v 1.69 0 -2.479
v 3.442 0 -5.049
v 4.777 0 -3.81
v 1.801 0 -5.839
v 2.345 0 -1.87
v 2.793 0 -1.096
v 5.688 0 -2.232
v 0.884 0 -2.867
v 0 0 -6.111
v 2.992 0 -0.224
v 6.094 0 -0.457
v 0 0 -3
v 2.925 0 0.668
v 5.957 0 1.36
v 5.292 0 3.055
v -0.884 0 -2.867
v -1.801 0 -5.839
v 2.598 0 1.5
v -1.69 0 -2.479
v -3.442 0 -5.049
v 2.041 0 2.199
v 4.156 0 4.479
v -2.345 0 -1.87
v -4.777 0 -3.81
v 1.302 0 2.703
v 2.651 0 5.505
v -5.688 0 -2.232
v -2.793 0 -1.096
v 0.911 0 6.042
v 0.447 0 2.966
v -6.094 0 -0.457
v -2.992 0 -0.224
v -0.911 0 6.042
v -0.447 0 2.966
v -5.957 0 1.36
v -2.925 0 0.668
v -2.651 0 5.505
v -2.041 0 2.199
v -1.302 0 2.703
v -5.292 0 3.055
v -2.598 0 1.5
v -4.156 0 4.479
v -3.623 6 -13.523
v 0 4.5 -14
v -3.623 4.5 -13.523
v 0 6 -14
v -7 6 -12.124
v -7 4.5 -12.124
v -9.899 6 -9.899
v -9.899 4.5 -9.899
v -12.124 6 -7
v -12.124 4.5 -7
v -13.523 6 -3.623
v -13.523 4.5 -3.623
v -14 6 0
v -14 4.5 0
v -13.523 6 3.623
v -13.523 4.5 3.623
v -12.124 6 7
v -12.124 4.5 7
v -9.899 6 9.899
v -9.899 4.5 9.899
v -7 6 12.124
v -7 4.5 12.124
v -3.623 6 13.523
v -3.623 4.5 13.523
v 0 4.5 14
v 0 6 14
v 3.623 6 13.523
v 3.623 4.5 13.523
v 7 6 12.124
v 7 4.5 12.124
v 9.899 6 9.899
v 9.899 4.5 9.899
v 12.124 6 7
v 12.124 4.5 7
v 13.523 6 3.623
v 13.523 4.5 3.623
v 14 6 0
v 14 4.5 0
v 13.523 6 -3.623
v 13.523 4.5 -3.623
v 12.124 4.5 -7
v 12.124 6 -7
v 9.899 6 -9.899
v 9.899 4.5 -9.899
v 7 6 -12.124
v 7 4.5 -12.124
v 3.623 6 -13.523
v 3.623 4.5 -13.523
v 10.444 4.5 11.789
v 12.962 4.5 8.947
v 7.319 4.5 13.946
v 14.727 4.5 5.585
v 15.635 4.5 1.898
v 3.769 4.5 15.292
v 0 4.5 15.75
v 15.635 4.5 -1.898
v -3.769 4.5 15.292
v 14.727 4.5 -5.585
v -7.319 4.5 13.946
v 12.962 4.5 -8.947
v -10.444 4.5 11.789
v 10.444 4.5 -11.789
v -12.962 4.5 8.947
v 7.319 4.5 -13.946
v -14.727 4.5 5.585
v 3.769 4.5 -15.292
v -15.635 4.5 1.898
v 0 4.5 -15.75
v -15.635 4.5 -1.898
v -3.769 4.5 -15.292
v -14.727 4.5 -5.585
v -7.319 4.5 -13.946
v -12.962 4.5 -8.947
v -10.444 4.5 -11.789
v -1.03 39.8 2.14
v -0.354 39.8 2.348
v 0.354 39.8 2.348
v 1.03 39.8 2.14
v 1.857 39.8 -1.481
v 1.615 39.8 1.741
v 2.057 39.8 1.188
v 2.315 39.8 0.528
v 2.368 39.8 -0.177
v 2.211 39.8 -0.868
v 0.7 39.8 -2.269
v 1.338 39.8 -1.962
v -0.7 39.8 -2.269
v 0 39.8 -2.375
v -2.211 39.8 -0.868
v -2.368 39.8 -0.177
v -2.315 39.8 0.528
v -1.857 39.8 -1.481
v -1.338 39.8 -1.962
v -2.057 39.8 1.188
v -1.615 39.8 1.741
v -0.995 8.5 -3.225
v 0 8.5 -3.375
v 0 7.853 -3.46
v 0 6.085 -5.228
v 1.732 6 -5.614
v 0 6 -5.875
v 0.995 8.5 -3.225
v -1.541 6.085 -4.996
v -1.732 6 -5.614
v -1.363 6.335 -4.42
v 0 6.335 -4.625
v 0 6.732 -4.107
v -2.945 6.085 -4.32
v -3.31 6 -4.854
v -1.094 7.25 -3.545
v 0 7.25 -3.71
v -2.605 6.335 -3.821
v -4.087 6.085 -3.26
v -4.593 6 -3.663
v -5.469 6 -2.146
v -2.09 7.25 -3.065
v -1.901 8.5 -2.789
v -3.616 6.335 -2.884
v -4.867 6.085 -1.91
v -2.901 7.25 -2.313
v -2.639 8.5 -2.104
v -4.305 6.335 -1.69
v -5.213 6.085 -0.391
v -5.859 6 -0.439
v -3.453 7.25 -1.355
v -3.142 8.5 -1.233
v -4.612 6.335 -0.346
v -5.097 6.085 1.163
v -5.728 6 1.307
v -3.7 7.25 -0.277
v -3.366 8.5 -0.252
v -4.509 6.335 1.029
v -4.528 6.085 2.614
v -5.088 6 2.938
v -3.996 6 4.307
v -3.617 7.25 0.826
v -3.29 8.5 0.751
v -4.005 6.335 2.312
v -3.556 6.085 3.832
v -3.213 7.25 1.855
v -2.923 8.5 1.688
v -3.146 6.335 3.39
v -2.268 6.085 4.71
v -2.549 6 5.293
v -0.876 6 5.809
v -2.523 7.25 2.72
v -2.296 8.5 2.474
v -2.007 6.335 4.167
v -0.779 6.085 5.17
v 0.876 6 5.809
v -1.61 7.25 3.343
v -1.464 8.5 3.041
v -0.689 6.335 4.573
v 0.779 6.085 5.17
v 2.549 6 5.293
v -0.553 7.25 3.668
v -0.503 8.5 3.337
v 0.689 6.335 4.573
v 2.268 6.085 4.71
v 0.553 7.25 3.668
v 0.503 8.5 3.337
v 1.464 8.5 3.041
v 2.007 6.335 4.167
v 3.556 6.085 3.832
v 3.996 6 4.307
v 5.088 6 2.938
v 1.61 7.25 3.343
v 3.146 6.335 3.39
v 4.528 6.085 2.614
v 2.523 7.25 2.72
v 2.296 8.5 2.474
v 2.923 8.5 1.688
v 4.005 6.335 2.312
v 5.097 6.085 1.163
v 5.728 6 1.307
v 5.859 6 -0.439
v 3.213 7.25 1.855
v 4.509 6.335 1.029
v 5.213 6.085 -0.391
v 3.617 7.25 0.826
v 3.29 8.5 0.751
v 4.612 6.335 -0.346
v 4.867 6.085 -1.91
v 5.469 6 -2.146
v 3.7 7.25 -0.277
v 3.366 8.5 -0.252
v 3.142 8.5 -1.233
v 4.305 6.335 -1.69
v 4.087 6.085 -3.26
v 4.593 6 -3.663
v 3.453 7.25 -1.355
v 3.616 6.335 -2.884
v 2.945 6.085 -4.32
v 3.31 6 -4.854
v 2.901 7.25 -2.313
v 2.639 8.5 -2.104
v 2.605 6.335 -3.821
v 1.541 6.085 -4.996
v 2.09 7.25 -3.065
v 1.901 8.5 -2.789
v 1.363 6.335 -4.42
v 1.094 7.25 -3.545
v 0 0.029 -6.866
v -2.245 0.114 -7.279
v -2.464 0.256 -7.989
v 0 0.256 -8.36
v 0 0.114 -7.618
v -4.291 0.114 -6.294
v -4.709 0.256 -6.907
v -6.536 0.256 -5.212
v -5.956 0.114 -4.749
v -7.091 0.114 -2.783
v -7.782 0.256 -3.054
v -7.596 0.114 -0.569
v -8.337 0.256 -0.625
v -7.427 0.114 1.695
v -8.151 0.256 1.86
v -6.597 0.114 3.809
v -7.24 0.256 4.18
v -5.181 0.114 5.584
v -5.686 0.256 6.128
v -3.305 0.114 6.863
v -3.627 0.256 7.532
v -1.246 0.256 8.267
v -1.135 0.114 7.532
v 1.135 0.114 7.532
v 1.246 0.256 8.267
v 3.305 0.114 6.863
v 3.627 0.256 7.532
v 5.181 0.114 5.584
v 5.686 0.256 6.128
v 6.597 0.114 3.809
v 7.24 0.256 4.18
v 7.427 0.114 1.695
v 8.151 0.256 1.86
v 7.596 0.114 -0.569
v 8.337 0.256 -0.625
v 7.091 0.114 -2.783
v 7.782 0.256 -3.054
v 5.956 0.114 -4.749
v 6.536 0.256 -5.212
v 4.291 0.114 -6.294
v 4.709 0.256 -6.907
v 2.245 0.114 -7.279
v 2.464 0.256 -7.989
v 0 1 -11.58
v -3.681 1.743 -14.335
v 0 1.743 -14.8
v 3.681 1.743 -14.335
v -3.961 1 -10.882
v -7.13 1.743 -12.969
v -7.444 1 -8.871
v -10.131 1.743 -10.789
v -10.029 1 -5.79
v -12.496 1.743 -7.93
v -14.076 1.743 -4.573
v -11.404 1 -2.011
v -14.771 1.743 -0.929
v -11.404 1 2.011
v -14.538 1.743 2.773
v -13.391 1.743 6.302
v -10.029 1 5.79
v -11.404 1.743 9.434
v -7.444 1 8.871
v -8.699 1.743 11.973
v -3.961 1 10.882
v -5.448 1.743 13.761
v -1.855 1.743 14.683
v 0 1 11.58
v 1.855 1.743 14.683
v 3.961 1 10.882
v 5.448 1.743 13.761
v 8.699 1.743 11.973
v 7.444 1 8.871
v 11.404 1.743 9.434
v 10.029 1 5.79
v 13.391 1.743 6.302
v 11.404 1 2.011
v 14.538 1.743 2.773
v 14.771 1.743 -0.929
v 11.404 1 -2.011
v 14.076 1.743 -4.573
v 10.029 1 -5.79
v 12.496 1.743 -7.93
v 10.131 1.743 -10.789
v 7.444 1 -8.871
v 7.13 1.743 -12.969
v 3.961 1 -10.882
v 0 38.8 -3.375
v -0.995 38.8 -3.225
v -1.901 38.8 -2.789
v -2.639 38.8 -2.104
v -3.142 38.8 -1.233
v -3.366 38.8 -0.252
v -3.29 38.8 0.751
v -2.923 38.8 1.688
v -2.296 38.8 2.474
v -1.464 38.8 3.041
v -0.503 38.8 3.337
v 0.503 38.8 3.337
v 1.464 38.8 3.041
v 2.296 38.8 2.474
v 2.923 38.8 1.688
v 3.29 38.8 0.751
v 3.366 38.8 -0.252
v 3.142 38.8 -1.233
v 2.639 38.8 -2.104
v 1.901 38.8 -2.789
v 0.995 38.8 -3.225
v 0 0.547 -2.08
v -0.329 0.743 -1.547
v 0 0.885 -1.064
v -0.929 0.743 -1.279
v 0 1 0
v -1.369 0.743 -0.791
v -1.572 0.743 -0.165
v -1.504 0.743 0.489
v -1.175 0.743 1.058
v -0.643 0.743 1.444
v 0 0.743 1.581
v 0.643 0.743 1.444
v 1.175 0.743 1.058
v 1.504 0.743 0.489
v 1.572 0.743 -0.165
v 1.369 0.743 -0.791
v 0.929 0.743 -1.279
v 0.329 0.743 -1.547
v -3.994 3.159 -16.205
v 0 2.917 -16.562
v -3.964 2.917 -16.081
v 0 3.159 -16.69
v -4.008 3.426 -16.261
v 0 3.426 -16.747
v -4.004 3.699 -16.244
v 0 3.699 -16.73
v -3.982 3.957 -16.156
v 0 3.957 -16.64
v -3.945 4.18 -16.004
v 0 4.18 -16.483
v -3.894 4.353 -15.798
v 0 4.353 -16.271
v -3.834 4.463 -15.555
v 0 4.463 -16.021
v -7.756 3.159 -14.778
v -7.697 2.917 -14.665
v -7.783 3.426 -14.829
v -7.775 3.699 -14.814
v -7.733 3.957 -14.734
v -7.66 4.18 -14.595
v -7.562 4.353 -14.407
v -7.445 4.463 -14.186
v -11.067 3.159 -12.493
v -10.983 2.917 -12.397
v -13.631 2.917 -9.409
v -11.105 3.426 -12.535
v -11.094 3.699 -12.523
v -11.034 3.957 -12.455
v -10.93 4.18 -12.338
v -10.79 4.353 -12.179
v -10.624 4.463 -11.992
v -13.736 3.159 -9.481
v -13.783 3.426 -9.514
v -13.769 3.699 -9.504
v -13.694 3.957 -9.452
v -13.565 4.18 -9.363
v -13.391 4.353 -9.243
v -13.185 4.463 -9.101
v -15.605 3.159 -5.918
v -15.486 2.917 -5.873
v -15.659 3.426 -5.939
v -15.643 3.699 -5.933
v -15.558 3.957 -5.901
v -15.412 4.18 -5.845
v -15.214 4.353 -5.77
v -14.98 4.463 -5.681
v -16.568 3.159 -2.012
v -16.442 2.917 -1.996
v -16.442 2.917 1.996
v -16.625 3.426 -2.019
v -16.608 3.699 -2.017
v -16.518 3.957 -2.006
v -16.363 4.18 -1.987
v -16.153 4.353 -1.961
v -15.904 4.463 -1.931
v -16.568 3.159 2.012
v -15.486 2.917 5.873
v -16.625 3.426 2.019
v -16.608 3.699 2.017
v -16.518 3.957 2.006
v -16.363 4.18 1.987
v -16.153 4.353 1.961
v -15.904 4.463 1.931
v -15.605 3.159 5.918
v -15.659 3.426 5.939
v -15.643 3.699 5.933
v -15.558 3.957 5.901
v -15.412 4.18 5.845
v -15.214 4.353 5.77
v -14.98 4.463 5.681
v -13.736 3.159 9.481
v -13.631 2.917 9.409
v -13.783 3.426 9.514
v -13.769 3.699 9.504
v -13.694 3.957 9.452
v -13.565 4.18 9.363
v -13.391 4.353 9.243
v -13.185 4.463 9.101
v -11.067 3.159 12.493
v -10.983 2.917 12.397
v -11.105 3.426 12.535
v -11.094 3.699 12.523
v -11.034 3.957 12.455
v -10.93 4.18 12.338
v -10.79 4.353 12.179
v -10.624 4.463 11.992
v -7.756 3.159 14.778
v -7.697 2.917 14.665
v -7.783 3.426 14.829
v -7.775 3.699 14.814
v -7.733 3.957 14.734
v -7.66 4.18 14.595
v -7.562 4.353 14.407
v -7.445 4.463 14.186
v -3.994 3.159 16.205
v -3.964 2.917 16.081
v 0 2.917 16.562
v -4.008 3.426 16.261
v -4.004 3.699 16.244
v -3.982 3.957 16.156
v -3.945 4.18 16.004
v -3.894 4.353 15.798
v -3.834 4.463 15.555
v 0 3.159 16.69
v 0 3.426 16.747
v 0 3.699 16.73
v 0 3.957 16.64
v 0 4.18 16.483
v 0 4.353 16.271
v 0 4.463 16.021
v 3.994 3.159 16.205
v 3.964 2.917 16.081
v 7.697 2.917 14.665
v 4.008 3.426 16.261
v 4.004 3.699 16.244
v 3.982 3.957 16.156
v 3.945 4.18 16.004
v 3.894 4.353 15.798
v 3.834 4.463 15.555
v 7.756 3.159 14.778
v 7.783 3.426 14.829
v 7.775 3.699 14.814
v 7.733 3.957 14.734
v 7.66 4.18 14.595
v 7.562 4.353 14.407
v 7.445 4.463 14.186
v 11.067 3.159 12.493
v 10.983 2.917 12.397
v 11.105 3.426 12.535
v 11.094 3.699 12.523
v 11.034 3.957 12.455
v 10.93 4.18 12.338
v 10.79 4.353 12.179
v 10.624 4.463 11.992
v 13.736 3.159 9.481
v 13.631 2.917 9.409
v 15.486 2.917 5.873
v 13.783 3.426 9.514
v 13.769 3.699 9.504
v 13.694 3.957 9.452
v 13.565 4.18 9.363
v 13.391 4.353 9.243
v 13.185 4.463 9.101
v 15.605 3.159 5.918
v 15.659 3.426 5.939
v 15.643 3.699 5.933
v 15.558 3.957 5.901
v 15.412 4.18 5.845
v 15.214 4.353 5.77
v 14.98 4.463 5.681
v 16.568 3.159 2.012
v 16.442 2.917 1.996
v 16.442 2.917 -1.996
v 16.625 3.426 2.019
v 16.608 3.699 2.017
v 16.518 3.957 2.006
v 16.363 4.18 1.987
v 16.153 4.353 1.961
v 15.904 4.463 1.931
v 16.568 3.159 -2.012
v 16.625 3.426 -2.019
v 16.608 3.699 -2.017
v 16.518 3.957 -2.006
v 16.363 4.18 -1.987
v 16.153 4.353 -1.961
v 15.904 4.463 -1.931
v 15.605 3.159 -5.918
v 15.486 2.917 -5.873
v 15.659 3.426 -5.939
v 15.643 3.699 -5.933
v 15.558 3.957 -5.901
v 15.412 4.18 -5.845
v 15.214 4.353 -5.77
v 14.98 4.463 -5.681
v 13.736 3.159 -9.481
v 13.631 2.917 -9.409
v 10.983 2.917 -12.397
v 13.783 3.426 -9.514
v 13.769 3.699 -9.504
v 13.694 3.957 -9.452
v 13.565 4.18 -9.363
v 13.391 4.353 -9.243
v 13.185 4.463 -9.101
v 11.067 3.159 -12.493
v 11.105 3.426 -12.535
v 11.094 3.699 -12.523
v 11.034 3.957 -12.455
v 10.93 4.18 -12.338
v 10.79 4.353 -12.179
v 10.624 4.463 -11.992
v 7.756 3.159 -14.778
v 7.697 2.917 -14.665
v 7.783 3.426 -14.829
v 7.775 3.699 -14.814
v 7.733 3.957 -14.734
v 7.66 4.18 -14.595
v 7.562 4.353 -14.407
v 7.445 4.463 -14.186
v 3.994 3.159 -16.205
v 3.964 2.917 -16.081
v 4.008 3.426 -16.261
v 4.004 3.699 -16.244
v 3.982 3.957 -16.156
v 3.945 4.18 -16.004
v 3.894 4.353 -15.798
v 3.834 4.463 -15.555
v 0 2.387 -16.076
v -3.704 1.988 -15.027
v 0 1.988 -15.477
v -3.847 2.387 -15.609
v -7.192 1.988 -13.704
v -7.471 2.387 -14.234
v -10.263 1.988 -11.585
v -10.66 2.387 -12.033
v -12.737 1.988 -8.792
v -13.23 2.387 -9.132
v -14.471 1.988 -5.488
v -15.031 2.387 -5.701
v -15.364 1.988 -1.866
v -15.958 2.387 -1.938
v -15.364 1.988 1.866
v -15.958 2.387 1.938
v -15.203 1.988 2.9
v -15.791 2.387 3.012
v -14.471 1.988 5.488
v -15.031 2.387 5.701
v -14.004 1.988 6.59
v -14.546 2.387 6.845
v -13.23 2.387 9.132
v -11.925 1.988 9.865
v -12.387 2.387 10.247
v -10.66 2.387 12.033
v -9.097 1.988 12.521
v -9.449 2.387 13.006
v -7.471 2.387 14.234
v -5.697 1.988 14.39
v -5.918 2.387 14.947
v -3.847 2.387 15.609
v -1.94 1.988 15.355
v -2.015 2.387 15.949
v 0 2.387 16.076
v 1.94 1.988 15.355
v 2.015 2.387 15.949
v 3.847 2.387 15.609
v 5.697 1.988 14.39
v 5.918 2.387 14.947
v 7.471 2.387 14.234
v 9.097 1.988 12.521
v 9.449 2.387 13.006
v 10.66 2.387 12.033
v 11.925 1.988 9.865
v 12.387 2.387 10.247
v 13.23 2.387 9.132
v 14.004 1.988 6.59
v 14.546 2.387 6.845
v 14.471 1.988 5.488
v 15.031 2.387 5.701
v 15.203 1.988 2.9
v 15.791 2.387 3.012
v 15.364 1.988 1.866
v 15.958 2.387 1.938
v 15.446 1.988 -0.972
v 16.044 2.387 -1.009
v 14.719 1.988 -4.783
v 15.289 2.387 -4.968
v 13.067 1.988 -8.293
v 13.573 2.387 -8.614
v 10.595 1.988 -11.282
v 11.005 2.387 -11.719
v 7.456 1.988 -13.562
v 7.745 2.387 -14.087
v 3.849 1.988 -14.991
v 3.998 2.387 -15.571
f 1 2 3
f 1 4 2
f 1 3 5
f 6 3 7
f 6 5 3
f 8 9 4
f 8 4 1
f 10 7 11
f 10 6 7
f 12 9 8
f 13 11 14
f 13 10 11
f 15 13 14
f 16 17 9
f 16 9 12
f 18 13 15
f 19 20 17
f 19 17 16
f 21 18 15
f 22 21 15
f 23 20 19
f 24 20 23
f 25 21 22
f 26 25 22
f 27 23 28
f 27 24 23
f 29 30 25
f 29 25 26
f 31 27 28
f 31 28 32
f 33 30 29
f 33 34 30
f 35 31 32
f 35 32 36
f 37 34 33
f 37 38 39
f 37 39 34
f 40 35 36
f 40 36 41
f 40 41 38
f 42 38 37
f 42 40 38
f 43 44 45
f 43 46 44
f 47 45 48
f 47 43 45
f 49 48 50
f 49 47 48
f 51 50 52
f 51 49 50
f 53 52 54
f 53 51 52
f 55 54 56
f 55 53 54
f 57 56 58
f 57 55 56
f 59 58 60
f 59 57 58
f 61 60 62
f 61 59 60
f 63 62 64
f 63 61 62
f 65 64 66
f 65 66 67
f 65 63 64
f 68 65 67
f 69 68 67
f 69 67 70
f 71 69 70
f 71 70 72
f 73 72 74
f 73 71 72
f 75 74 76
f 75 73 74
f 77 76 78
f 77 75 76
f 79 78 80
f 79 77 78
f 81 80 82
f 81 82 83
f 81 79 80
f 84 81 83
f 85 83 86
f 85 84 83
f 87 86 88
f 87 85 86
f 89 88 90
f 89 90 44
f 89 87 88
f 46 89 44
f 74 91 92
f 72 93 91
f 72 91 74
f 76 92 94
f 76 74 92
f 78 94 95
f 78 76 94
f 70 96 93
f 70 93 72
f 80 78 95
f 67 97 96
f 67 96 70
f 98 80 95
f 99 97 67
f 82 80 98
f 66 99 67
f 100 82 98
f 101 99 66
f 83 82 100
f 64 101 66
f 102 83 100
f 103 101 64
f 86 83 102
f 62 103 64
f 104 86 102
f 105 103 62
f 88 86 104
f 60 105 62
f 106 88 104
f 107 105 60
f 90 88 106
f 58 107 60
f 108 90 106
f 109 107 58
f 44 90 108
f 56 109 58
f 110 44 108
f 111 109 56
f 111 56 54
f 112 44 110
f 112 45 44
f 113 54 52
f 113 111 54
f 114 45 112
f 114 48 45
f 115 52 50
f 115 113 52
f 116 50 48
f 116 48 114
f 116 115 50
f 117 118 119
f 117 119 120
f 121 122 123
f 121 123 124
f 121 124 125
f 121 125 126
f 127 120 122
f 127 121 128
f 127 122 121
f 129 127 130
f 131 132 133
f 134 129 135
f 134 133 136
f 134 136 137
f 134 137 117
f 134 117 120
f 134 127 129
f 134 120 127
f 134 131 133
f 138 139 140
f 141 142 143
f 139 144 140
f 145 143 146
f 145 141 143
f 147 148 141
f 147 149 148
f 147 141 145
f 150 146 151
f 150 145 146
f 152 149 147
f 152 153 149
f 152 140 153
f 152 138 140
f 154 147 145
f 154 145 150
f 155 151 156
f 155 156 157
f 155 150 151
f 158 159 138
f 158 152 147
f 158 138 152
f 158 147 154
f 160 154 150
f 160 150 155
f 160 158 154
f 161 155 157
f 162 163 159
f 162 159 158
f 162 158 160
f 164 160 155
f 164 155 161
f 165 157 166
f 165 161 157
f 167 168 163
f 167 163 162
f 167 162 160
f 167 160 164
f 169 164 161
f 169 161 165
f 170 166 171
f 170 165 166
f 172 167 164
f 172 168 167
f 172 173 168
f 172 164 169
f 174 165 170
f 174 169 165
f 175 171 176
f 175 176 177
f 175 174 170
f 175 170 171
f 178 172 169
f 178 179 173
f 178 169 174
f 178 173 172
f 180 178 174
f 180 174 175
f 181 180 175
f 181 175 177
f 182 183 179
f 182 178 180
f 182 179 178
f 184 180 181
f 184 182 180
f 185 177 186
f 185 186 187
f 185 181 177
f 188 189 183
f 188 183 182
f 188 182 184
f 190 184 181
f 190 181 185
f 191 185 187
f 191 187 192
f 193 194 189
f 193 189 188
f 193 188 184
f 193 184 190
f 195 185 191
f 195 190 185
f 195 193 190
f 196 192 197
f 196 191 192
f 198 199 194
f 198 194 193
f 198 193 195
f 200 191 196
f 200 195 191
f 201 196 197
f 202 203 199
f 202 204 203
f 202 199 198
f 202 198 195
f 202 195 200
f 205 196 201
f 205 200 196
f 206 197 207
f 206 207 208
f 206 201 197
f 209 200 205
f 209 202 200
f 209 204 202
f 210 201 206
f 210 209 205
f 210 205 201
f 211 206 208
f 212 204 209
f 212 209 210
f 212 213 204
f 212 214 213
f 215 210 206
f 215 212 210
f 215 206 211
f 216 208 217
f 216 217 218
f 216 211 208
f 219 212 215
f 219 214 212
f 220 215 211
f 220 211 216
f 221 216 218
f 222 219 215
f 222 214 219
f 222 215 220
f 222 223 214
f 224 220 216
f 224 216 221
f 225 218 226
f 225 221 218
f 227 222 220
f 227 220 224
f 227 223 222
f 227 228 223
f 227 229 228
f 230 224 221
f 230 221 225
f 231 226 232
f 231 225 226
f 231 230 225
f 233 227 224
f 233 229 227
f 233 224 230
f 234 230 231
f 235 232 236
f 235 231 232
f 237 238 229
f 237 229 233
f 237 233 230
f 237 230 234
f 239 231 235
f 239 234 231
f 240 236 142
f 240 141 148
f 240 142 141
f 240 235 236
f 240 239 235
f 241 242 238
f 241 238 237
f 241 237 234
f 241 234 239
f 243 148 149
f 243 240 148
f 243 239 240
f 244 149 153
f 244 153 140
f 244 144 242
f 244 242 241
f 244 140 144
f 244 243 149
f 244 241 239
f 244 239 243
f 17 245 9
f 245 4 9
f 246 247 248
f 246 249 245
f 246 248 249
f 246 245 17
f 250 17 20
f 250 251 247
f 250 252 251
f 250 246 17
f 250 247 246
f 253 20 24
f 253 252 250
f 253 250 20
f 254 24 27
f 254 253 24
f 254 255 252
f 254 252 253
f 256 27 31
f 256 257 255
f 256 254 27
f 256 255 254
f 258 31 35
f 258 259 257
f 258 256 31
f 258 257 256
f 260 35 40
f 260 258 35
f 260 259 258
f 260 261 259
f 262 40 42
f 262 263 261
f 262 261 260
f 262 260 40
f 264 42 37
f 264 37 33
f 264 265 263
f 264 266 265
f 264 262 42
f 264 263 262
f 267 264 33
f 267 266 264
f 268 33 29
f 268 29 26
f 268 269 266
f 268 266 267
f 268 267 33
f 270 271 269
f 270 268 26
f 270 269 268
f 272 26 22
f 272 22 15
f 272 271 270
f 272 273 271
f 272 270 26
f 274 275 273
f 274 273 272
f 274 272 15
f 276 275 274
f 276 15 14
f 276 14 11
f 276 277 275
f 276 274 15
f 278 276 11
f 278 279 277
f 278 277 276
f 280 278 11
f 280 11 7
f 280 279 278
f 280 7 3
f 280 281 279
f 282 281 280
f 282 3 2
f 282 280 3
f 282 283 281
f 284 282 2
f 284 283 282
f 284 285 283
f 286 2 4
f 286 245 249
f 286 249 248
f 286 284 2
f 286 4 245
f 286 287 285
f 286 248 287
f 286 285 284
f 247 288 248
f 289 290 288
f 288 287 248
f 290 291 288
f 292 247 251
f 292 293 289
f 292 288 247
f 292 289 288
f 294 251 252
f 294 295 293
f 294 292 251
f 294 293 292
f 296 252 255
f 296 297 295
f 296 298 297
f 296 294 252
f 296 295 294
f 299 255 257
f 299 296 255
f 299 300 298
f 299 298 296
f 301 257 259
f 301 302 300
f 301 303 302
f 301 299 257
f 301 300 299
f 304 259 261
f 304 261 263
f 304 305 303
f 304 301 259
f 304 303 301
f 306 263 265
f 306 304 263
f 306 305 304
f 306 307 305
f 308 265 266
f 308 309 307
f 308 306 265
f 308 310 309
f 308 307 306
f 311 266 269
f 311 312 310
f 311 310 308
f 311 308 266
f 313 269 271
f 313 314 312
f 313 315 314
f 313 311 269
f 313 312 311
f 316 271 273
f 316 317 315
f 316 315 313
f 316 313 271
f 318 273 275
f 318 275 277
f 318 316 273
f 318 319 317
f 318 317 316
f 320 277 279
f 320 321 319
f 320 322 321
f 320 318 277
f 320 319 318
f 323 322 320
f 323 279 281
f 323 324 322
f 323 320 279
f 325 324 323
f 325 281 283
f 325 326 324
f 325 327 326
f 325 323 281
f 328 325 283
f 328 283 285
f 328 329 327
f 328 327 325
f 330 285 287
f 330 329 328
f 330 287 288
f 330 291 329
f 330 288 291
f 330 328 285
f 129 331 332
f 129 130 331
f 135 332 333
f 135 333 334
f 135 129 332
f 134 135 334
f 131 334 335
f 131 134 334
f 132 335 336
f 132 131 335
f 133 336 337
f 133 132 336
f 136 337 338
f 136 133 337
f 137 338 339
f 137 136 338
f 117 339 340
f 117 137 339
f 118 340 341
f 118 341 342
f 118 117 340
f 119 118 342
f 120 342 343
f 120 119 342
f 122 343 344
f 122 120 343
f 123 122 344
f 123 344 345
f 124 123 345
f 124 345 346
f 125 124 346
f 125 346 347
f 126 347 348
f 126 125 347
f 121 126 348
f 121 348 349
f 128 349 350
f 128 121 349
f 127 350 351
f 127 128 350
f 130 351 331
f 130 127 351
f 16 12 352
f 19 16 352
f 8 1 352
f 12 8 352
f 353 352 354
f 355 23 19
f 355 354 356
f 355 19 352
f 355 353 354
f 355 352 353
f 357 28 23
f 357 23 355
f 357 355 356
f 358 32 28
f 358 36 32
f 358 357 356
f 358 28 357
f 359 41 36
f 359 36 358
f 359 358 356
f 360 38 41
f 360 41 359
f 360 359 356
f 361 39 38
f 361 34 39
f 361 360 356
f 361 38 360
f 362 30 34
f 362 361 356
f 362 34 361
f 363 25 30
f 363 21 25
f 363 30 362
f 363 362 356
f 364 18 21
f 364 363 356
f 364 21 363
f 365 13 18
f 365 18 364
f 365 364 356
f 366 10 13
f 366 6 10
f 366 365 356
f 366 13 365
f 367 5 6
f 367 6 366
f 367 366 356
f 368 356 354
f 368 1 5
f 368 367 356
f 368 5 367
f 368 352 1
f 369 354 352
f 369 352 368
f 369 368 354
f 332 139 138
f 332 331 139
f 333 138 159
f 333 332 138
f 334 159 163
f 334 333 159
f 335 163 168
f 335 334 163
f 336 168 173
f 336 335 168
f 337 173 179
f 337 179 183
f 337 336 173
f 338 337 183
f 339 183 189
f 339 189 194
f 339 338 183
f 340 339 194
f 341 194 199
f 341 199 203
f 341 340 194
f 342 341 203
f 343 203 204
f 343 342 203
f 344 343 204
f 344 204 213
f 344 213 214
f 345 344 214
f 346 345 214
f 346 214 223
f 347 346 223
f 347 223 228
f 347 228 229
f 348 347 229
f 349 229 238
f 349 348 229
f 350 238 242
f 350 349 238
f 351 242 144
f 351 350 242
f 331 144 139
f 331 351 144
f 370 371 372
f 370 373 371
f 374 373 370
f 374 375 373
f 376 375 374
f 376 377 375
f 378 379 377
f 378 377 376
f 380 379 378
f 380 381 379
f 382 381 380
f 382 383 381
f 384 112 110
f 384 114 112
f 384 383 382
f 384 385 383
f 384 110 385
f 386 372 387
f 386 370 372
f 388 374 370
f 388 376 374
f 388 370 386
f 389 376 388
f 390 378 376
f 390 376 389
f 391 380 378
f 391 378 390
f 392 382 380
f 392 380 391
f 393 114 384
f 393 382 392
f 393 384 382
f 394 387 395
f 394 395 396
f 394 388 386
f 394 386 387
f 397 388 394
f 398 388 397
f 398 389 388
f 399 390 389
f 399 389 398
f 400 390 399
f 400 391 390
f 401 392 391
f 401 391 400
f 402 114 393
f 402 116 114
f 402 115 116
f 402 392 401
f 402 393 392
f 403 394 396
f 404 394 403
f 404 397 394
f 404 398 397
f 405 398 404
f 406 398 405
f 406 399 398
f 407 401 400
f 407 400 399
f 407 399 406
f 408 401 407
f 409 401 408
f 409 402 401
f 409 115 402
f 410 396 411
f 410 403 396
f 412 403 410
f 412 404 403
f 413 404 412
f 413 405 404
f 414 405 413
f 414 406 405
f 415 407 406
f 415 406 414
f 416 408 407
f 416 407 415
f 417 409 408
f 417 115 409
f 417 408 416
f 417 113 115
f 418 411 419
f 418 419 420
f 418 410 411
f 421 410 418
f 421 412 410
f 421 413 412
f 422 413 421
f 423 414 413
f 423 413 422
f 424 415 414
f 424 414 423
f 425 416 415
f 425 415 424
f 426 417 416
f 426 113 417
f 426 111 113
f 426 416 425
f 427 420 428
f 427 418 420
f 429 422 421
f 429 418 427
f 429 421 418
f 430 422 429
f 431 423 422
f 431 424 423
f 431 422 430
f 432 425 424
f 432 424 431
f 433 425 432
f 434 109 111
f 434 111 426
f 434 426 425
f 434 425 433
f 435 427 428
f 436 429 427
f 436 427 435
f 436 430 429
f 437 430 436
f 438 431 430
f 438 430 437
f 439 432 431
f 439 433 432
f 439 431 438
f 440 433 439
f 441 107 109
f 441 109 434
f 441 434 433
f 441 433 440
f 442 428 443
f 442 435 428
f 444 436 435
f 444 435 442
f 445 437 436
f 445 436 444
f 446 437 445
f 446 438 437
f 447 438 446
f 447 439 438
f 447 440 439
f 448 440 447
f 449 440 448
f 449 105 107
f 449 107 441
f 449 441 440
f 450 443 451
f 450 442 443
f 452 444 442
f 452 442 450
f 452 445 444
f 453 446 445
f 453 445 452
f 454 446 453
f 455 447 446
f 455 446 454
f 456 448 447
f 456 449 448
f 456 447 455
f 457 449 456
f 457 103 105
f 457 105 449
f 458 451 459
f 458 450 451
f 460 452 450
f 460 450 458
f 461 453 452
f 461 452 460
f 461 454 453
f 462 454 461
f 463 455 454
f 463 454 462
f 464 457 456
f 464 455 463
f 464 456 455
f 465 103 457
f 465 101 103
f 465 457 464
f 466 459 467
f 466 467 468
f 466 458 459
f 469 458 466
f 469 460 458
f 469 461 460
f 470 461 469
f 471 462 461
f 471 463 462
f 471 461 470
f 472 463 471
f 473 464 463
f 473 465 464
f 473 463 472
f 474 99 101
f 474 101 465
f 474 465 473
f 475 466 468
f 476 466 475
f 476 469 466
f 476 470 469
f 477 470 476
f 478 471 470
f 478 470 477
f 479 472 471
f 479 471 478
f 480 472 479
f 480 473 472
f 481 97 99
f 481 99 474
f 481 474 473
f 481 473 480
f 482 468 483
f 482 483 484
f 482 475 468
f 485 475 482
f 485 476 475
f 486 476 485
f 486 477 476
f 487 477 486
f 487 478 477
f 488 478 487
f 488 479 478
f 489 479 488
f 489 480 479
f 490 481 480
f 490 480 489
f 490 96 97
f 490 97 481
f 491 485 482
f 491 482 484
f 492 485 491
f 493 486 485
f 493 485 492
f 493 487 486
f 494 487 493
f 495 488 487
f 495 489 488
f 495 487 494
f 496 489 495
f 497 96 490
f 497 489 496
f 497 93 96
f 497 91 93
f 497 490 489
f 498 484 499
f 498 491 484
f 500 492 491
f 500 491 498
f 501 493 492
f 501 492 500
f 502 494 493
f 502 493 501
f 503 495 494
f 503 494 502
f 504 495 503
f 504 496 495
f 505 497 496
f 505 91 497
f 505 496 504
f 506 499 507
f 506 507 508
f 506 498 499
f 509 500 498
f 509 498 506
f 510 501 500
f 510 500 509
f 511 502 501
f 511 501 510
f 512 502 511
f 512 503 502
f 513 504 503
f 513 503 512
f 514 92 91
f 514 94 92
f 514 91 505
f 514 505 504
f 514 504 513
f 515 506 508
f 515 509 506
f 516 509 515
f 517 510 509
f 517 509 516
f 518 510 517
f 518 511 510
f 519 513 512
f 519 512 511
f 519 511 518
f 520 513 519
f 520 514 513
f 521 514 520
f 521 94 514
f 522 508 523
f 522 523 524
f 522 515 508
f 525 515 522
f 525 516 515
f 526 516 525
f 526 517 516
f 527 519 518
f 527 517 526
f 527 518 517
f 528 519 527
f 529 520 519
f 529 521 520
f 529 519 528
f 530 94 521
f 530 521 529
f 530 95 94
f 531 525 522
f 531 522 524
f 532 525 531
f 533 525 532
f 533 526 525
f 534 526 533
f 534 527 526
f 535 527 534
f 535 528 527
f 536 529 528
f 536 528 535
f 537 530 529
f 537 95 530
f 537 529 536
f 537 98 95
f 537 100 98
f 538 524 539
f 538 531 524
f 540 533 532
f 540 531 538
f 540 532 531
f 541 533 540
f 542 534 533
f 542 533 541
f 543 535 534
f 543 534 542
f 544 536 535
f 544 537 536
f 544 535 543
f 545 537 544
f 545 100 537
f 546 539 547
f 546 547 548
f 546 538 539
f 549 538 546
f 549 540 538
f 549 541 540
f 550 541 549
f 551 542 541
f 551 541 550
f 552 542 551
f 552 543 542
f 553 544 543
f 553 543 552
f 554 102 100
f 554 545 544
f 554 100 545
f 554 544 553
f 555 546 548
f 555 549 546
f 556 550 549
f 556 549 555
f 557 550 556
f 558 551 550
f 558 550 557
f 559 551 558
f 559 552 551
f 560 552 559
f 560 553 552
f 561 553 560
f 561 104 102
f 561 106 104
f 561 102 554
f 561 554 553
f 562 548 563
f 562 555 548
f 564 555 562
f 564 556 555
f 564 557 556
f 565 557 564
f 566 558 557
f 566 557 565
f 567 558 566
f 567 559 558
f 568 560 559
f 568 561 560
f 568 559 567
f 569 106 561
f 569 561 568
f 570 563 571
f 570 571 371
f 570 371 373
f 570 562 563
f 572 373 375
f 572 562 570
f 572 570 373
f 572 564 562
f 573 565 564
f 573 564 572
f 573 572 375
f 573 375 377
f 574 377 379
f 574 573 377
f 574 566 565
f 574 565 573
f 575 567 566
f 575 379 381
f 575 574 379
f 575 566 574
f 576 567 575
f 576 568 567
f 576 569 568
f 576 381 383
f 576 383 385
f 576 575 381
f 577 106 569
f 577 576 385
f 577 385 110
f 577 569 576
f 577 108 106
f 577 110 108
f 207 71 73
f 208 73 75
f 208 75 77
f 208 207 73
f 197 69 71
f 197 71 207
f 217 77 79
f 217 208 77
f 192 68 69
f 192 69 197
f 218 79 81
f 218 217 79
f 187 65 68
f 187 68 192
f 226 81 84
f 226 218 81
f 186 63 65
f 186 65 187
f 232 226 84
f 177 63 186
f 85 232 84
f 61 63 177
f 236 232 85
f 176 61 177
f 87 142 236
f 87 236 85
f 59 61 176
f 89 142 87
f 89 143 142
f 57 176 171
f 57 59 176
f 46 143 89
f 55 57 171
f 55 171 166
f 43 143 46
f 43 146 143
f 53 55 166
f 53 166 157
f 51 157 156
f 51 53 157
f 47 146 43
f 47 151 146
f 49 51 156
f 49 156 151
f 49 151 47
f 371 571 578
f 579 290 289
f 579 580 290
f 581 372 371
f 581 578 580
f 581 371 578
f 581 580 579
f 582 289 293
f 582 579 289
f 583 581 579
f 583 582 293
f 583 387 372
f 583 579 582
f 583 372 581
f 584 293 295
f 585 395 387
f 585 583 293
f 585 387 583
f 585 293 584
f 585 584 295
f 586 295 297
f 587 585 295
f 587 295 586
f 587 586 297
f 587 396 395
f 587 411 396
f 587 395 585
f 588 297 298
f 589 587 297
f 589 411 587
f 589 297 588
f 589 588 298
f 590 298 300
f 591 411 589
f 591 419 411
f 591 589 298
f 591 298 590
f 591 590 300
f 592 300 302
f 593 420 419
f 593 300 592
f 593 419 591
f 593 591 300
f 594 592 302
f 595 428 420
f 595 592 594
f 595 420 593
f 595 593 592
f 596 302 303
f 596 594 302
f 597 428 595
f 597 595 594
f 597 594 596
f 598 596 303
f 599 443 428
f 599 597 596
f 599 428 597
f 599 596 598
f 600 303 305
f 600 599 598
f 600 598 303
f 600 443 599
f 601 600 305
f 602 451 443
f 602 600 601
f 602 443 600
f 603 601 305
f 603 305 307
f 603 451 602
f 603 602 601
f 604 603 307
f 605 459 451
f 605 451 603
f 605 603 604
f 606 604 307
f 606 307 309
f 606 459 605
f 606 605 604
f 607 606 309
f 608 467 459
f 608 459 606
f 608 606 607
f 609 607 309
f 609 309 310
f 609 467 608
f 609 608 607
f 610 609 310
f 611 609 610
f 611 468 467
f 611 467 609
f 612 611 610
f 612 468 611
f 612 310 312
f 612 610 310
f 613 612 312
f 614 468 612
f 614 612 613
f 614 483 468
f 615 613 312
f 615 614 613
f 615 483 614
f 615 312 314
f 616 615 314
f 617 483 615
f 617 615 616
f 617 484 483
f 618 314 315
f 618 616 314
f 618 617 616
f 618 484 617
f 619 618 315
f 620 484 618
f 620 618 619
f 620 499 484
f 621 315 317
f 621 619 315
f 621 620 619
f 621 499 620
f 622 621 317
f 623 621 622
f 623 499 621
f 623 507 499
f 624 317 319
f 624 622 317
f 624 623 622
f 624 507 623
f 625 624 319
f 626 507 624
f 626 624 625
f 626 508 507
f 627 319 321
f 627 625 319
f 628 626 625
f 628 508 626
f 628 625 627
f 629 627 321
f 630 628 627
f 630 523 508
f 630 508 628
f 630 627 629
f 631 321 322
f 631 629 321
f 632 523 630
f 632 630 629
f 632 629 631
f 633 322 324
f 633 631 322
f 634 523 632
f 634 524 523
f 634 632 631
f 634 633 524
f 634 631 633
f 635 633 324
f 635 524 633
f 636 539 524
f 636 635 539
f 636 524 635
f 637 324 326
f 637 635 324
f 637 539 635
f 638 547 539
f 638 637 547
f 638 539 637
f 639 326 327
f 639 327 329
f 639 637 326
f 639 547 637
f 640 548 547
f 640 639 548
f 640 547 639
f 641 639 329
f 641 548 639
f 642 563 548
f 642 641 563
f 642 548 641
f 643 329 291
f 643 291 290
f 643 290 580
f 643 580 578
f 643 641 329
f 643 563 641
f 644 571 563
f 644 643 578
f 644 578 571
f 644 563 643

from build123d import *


with BuildPart() as part:
    # Sketch1 → Revolve1 (revolve)
    with BuildSketch(Plane.XY, mode=Mode.PRIVATE) as revolve1_sk:
        with BuildLine():
            Line((3, 0), (6.110643917, 0))
            ThreePointArc((6.110643917, 0), (7.242676055, 0.064281443), (8.36015446, 0.256299352))
            Line((8.36015446, 0.256299352), (14.800032714, 1.743062396))
            ThreePointArc((14.800032714, 1.743062396), (15.788233421, 2.169324212), (16.562410224, 2.916913705))
            ThreePointArc((16.562410224, 2.916913705), (16.639687107, 3.956570753), (15.75, 4.5))
            Line((15.75, 4.5), (14, 4.5))
            Line((14, 4.5), (14, 6))
            Line((14, 6), (5.875, 6))
            ThreePointArc((5.875, 6), (4.107233047, 6.732233047), (3.375, 8.5))
            Line((3.375, 8.5), (3.375, 38.8))
            Line((3.375, 38.8), (2.375, 39.8))
            Line((2.375, 39.8), (0, 39.8))
            Line((0, 39.8), (0, 1))
            ThreePointArc((0, 1), (1.58113883, 0.74341649), (3, 0))
        make_face()
    revolve(revolve1_sk.sketch.rotate(Axis((0, 0, 0), (0, 1, 0)), 90), axis=Axis((0, 0, 0), (0, 1, 0)))


solid = part.part
